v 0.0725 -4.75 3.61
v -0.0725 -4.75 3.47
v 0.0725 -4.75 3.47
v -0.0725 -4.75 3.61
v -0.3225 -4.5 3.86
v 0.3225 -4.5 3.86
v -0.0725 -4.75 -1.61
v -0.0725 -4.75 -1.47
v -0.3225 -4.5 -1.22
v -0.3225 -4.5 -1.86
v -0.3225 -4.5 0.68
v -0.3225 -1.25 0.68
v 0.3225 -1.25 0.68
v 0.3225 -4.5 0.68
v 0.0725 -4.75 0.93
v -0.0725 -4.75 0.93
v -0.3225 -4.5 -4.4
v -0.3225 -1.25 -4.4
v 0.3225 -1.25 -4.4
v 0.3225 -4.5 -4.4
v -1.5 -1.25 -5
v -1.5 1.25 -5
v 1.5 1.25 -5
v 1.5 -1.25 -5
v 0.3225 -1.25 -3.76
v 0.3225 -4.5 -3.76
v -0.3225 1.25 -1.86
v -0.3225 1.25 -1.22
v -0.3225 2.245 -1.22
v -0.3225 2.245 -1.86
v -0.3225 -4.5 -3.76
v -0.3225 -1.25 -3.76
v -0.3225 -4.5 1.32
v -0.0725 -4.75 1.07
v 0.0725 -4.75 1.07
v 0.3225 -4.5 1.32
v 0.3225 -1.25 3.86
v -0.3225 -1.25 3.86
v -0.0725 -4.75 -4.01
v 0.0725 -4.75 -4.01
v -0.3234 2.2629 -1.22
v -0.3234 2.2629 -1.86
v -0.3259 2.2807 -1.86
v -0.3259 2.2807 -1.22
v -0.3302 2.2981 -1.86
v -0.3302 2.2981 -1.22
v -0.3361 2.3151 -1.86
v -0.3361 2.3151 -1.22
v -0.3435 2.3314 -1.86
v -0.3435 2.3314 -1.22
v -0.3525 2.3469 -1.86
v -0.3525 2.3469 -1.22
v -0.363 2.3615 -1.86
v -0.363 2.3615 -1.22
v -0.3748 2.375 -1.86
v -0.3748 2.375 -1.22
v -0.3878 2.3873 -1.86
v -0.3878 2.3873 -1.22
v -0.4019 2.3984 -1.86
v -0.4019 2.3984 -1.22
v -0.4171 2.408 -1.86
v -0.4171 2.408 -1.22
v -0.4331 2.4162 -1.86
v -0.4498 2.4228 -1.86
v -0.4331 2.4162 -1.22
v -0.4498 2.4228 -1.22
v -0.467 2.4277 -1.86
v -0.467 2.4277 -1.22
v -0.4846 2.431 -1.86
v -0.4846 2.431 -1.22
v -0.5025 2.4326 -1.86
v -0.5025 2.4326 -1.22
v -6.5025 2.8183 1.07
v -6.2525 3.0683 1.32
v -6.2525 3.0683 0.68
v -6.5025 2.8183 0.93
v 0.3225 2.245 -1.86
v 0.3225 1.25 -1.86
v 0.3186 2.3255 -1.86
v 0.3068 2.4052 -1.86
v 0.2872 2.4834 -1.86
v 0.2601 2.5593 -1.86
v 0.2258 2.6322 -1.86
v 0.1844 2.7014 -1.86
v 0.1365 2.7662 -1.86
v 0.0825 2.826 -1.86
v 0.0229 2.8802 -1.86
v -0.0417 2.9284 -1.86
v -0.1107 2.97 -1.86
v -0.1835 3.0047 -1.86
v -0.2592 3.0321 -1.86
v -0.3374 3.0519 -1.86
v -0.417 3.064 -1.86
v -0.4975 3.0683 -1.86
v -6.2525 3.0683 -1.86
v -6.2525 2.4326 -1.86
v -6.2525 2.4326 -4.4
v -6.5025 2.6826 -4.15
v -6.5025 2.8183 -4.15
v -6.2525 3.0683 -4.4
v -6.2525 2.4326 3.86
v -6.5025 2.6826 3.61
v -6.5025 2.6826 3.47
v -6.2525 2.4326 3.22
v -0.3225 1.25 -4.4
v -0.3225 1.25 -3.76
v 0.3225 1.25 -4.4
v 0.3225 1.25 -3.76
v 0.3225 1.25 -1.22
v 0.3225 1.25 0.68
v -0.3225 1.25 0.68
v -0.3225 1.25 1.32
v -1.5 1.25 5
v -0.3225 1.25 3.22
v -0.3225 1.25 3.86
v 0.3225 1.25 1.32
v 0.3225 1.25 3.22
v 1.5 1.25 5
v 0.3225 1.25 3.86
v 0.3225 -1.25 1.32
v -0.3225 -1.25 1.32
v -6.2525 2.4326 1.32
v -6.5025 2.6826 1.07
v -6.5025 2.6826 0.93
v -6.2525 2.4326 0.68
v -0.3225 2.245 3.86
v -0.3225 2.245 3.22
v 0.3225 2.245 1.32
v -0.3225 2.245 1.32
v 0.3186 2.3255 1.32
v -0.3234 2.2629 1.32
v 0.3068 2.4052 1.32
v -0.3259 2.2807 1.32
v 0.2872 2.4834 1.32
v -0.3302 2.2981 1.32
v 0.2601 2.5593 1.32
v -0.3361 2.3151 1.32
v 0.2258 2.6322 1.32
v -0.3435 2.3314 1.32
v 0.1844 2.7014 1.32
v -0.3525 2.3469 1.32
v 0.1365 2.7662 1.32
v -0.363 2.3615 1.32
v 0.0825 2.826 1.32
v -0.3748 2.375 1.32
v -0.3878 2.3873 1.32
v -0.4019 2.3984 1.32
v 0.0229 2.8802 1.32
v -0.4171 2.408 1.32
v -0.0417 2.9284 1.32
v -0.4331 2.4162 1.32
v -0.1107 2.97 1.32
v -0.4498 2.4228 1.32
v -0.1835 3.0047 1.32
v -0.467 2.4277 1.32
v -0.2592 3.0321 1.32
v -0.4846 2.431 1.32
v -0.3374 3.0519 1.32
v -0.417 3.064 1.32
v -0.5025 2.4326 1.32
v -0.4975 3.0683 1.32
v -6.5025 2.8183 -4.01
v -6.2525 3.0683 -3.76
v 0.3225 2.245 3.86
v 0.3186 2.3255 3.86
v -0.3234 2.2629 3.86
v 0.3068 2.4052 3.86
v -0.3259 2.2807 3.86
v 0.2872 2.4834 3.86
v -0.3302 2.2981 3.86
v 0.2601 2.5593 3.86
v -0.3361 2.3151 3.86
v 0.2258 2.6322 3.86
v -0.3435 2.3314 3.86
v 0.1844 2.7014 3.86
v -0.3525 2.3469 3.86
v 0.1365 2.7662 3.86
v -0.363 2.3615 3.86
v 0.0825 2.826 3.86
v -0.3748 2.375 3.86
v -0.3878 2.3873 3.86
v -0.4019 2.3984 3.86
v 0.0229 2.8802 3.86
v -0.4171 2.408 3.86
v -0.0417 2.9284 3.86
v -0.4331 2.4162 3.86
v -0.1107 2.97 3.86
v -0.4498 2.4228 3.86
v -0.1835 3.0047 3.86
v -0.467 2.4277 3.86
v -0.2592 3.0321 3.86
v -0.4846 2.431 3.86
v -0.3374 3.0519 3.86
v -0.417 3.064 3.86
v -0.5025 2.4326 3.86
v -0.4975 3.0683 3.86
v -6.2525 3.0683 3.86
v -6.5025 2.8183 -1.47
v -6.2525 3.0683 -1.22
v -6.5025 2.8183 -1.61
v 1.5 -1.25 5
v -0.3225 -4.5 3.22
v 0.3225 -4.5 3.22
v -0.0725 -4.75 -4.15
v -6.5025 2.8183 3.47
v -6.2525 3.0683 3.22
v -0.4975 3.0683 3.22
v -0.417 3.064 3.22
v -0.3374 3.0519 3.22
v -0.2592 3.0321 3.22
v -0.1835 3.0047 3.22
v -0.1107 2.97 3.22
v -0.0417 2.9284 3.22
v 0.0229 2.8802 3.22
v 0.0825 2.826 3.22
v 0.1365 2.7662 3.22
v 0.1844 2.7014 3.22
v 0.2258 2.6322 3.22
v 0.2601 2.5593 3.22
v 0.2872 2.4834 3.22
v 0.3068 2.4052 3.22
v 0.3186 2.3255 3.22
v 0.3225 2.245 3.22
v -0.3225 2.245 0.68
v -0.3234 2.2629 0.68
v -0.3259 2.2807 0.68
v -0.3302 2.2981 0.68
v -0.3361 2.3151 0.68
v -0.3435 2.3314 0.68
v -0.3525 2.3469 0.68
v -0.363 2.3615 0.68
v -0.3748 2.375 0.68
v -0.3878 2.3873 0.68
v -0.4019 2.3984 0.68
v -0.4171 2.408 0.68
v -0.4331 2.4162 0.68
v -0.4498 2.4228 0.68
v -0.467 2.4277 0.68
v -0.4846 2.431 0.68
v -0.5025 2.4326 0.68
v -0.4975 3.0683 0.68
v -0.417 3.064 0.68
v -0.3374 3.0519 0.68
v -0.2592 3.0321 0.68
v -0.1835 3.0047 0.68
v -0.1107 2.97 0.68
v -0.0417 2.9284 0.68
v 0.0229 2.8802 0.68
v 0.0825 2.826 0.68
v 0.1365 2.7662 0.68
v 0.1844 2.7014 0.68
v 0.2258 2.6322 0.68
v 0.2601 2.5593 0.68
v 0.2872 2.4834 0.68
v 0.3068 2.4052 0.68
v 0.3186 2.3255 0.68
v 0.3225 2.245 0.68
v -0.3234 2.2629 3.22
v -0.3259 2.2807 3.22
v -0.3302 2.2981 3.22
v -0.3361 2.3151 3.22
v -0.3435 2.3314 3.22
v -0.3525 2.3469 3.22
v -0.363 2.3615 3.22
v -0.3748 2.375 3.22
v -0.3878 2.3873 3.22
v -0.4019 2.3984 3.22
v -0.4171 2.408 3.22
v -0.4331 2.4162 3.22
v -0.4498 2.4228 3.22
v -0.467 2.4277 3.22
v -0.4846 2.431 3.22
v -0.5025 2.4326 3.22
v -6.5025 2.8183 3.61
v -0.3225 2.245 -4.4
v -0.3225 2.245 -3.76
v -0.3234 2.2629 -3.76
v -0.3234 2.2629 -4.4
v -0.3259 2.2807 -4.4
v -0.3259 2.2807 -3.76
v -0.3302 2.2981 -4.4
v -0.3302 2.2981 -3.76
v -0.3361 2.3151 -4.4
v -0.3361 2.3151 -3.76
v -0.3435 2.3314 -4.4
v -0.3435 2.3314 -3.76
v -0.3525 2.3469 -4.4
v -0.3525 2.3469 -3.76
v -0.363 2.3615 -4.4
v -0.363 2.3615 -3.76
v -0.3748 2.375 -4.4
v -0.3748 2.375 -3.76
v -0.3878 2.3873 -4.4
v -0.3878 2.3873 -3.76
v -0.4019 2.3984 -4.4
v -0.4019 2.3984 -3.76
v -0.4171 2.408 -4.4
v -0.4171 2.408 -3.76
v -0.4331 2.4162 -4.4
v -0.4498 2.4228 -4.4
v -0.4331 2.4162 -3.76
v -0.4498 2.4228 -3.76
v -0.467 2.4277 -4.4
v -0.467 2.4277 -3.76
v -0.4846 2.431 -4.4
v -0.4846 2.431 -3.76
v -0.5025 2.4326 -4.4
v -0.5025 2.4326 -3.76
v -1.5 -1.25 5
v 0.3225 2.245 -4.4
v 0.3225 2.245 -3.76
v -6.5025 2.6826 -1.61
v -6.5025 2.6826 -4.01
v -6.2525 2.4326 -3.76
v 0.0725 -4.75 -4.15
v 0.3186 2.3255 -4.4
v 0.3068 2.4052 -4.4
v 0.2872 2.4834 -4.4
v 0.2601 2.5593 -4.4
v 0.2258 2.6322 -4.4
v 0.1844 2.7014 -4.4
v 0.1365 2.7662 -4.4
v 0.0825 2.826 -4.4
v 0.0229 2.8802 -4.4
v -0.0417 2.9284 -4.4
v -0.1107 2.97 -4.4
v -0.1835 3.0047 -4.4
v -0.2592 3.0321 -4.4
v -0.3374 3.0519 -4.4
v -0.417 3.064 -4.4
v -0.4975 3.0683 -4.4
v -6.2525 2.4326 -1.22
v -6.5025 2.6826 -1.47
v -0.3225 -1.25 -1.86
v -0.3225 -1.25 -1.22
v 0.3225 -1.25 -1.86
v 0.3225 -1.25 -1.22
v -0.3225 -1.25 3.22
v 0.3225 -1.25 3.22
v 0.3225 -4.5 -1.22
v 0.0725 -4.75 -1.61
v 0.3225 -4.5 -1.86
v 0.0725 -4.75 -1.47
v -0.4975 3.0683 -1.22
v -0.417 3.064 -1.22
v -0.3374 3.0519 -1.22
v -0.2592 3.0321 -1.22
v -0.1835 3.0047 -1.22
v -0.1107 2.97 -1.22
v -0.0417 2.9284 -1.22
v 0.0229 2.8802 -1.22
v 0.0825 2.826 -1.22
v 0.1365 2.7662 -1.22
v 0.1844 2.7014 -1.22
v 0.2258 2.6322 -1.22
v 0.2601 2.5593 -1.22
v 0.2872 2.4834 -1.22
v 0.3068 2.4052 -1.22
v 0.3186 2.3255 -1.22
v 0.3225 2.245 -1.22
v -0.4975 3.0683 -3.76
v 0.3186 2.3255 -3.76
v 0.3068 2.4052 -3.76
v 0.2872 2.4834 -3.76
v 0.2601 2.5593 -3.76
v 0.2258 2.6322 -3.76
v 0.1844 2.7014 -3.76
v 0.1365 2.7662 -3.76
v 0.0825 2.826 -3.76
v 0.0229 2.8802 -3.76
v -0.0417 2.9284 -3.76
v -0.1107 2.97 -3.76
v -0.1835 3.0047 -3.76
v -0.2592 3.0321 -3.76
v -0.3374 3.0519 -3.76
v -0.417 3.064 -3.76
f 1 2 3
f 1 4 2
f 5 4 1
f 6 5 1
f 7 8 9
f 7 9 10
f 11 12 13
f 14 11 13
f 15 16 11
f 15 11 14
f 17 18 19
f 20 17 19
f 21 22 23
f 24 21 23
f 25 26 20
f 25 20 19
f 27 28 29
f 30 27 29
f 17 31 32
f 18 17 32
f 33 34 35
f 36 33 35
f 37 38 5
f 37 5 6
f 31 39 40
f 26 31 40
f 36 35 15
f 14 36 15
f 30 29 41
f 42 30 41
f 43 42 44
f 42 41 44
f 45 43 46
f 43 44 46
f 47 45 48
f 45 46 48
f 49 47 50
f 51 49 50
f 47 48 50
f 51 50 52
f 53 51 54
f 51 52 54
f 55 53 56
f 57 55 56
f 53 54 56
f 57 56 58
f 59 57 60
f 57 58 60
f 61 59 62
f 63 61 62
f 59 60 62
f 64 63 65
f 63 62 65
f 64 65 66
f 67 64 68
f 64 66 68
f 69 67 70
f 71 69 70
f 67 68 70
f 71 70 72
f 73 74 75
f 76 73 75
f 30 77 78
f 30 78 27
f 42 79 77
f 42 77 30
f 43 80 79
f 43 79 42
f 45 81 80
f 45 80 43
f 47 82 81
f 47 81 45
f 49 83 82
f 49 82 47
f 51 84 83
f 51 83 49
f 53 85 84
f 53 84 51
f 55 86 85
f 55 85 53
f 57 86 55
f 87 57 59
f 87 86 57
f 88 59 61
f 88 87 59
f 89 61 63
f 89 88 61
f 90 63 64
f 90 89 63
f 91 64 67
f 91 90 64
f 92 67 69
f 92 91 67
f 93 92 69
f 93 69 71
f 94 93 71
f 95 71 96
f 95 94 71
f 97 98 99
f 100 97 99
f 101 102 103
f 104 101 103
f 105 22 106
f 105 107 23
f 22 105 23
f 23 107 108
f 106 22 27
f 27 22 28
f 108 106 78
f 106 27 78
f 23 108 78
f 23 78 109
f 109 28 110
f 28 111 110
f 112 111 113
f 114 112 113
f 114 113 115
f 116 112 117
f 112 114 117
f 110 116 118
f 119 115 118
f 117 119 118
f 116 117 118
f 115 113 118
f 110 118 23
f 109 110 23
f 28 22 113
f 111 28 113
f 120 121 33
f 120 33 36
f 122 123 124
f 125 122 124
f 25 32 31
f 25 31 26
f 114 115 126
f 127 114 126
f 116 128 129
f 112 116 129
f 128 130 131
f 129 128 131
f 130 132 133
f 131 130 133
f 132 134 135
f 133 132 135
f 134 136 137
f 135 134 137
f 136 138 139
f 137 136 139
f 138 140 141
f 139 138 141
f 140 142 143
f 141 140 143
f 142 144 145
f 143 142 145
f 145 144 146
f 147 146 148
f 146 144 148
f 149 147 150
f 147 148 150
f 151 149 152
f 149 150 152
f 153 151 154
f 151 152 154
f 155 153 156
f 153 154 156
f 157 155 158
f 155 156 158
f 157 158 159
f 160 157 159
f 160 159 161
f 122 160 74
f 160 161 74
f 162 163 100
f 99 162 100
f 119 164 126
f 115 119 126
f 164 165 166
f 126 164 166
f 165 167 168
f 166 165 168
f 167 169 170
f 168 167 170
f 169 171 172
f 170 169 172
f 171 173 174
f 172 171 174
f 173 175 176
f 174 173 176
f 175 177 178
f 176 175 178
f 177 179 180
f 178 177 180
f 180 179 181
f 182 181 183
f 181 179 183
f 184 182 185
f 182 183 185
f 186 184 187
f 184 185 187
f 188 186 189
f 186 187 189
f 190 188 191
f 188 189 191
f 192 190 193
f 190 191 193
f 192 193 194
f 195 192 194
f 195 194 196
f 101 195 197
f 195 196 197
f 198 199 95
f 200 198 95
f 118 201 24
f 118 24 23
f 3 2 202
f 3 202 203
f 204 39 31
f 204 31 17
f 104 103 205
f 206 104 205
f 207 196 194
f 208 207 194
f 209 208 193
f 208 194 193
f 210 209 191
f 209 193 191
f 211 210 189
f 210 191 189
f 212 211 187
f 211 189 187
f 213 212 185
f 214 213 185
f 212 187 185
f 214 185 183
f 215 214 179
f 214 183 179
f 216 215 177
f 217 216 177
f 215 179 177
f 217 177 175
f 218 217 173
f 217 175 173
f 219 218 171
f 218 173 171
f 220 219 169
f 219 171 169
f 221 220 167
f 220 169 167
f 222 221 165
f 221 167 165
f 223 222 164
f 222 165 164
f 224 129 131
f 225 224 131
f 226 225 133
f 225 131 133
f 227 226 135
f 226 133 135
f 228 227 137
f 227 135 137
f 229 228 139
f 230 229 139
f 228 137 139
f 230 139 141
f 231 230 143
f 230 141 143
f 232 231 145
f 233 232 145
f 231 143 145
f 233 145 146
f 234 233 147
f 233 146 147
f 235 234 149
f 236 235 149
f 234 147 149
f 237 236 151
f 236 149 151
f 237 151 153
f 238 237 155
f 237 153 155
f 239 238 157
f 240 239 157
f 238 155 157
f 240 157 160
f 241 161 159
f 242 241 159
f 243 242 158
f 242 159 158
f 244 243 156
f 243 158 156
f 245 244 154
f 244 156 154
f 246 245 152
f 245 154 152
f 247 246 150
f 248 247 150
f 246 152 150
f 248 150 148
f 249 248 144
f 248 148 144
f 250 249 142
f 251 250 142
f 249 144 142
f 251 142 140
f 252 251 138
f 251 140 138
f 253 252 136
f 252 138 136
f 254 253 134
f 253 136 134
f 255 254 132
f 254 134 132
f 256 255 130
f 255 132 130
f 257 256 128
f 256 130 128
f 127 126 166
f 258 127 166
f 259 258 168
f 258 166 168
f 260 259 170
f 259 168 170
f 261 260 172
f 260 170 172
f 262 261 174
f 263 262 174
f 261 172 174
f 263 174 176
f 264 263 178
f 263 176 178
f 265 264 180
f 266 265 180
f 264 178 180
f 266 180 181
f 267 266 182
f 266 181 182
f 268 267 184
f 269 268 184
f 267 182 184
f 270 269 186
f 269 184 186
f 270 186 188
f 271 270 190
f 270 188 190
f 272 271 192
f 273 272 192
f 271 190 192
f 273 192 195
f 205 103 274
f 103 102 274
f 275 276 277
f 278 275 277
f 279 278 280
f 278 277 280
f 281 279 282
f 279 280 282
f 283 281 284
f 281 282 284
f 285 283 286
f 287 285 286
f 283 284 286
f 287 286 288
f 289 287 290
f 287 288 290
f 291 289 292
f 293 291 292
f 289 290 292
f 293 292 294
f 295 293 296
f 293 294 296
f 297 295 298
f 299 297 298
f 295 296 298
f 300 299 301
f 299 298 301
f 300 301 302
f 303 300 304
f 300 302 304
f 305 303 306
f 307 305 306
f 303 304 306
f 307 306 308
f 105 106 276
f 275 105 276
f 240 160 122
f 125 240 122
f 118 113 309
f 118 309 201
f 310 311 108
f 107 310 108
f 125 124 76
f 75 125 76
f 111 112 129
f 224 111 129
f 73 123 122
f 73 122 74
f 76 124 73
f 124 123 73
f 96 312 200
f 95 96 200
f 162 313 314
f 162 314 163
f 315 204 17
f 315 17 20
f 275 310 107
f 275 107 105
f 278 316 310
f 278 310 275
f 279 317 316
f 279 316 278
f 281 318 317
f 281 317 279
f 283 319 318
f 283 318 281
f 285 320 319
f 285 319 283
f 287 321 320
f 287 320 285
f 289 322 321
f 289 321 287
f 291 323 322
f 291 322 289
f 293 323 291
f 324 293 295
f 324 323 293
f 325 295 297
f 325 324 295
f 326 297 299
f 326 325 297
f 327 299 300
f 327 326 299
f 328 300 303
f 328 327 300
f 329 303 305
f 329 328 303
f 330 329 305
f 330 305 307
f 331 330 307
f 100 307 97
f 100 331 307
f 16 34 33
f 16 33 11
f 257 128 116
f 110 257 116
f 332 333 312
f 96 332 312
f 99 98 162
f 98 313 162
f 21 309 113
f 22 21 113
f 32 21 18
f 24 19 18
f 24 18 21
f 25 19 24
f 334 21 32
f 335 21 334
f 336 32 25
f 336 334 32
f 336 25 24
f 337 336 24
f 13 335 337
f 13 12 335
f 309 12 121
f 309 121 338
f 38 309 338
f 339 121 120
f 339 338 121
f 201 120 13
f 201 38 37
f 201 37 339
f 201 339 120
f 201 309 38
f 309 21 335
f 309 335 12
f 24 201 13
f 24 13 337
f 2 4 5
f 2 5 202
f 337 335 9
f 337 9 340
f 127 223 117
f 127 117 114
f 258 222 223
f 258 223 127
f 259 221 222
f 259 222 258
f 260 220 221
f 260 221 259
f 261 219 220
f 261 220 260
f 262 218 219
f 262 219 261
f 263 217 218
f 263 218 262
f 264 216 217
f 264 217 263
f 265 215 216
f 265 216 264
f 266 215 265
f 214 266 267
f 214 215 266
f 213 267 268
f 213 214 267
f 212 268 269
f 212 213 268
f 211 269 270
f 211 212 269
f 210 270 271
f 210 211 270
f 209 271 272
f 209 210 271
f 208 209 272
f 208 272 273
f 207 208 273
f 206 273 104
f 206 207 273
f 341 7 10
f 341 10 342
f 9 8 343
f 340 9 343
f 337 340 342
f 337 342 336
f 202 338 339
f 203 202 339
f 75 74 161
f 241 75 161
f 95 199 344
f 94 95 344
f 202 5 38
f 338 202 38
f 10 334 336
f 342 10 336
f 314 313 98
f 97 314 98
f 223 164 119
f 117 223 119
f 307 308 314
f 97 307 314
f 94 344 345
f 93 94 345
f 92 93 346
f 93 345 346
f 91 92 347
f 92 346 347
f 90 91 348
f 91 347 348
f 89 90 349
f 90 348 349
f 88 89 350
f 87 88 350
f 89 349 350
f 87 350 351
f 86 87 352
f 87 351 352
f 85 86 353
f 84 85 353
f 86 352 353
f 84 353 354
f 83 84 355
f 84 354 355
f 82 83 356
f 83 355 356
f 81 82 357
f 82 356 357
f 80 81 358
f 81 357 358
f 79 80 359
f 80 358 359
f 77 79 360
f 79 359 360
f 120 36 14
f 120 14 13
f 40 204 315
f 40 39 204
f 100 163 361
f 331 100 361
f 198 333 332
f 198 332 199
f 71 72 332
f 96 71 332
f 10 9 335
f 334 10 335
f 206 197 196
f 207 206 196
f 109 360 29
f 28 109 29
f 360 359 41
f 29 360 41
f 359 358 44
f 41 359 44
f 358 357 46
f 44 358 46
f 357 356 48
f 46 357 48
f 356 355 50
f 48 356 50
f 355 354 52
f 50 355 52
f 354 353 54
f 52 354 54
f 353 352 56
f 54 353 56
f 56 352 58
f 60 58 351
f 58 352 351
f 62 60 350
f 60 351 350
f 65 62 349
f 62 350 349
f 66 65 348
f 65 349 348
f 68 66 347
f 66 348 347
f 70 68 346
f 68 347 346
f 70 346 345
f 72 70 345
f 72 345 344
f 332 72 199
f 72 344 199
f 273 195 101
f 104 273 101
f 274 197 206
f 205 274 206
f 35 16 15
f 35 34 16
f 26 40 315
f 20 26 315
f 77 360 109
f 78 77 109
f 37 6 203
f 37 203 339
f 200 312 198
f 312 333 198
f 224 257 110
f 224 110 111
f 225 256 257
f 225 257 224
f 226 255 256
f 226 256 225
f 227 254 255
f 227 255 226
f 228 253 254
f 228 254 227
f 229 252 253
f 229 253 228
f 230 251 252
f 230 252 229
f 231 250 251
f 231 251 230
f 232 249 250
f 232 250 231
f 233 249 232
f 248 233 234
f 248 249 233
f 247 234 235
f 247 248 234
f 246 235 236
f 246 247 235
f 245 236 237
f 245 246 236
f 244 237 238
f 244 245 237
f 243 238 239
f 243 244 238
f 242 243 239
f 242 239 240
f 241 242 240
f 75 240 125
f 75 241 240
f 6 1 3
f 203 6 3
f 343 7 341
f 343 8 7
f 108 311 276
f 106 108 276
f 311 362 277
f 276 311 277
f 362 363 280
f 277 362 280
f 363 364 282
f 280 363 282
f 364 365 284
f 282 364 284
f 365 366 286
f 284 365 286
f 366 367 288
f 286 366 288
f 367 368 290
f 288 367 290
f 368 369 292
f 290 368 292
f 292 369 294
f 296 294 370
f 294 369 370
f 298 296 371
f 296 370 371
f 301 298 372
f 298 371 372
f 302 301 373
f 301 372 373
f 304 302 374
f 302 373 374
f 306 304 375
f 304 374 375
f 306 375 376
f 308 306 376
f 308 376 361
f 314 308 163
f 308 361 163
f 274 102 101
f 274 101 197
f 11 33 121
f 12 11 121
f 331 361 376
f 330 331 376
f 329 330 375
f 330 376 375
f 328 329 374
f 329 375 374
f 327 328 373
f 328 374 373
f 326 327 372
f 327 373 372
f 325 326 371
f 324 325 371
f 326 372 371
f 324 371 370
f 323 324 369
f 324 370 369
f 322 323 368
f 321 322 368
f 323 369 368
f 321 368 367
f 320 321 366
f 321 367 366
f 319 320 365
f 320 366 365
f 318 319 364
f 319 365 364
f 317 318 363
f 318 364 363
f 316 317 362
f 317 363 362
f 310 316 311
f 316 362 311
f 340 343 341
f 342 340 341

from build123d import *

# Parameters (mm, degrees)
SKETCH1_W       = 3
SKETCH1_H       = 2.5
EXTRUDE1_DEPTH  = 5
SKETCH2_W       = 0.645
SKETCH2_H       = 3.5
EXTRUDE2_DEPTH  = 0.64
LPATTERN1_COUNT = 4
LPATTERN1_PITCH = 2.54
CHAMFER1_SIZE   = 0.25


with BuildPart() as part:
    # Sketch1 → Extrude1 (new body, symmetric)
    with BuildSketch(Plane.XY):
        Rectangle(SKETCH1_W, SKETCH1_H)
    extrude(amount=EXTRUDE1_DEPTH, both=True)

    # Sketch2 → Extrude2 (add)
    with BuildSketch(Plane.XY.offset(3.86)):
        with BuildLine():
            Line((-0.3225, 1.25), (-0.3225, 2.245))
            ThreePointArc((-0.3225, 2.245), (-0.374776878, 2.375), (-0.5025, 2.43261663))
            Line((-0.5025, 2.43261663), (-6.5025, 2.43261663))
            Line((-6.5025, 2.43261663), (-6.5025, 3.06831282))
            Line((-6.5025, 3.06831282), (-0.4975, 3.06831282))
            ThreePointArc((-0.4975, 3.06831282), (0.082527742, 2.826), (0.3225, 2.245))
            Line((0.3225, 2.245), (0.3225, 1.25))
            Line((0.3225, 1.25), (-0.3225, 1.25))
        make_face()
        with Locations((0, -3)):
            Rectangle(SKETCH2_W, SKETCH2_H)
    extrude2 = extrude(amount=-EXTRUDE2_DEPTH)

    # LPattern1: Extrude2 ×4
    with Locations(*[(0, 0, -i * LPATTERN1_PITCH) for i in range(1, LPATTERN1_COUNT)]):
        add(extrude2)

    # Chamfer1
    chamfer1_edges = [part.edges().sort_by_distance(p)[0] for p in [
        (-6.5025, 2.750464725, -4.4),
        (-6.5025, 2.43261663, -4.08),
        (-6.5025, 3.06831282, -4.08),
        (-6.5025, 2.750464725, -3.76),
        (0, -4.75, -4.4),
        (0.3225, -4.75, -4.08),
        (-0.3225, -4.75, -4.08),
        (0, -4.75, -3.76),
        (-6.5025, 2.750464725, 3.22),
        (-6.5025, 2.43261663, 3.54),
        (-6.5025, 3.06831282, 3.54),
        (-6.5025, 2.750464725, 3.86),
        (0, -4.75, 3.22),
        (0.3225, -4.75, 3.54),
        (-0.3225, -4.75, 3.54),
        (0, -4.75, 3.86),
        (-6.5025, 2.750464725, 0.68),
        (-6.5025, 2.43261663, 1),
        (-6.5025, 3.06831282, 1),
        (-6.5025, 2.750464725, 1.32),
        (0, -4.75, 0.68),
        (0.3225, -4.75, 1),
        (-0.3225, -4.75, 1),
        (0, -4.75, 1.32),
        (-6.5025, 2.750464725, -1.86),
        (-6.5025, 2.43261663, -1.54),
        (-6.5025, 3.06831282, -1.54),
        (-6.5025, 2.750464725, -1.22),
        (0, -4.75, -1.86),
        (0.3225, -4.75, -1.54),
        (-0.3225, -4.75, -1.54),
        (0, -4.75, -1.22),
    ]]
    chamfer(chamfer1_edges, length=CHAMFER1_SIZE)


solid = part.part
